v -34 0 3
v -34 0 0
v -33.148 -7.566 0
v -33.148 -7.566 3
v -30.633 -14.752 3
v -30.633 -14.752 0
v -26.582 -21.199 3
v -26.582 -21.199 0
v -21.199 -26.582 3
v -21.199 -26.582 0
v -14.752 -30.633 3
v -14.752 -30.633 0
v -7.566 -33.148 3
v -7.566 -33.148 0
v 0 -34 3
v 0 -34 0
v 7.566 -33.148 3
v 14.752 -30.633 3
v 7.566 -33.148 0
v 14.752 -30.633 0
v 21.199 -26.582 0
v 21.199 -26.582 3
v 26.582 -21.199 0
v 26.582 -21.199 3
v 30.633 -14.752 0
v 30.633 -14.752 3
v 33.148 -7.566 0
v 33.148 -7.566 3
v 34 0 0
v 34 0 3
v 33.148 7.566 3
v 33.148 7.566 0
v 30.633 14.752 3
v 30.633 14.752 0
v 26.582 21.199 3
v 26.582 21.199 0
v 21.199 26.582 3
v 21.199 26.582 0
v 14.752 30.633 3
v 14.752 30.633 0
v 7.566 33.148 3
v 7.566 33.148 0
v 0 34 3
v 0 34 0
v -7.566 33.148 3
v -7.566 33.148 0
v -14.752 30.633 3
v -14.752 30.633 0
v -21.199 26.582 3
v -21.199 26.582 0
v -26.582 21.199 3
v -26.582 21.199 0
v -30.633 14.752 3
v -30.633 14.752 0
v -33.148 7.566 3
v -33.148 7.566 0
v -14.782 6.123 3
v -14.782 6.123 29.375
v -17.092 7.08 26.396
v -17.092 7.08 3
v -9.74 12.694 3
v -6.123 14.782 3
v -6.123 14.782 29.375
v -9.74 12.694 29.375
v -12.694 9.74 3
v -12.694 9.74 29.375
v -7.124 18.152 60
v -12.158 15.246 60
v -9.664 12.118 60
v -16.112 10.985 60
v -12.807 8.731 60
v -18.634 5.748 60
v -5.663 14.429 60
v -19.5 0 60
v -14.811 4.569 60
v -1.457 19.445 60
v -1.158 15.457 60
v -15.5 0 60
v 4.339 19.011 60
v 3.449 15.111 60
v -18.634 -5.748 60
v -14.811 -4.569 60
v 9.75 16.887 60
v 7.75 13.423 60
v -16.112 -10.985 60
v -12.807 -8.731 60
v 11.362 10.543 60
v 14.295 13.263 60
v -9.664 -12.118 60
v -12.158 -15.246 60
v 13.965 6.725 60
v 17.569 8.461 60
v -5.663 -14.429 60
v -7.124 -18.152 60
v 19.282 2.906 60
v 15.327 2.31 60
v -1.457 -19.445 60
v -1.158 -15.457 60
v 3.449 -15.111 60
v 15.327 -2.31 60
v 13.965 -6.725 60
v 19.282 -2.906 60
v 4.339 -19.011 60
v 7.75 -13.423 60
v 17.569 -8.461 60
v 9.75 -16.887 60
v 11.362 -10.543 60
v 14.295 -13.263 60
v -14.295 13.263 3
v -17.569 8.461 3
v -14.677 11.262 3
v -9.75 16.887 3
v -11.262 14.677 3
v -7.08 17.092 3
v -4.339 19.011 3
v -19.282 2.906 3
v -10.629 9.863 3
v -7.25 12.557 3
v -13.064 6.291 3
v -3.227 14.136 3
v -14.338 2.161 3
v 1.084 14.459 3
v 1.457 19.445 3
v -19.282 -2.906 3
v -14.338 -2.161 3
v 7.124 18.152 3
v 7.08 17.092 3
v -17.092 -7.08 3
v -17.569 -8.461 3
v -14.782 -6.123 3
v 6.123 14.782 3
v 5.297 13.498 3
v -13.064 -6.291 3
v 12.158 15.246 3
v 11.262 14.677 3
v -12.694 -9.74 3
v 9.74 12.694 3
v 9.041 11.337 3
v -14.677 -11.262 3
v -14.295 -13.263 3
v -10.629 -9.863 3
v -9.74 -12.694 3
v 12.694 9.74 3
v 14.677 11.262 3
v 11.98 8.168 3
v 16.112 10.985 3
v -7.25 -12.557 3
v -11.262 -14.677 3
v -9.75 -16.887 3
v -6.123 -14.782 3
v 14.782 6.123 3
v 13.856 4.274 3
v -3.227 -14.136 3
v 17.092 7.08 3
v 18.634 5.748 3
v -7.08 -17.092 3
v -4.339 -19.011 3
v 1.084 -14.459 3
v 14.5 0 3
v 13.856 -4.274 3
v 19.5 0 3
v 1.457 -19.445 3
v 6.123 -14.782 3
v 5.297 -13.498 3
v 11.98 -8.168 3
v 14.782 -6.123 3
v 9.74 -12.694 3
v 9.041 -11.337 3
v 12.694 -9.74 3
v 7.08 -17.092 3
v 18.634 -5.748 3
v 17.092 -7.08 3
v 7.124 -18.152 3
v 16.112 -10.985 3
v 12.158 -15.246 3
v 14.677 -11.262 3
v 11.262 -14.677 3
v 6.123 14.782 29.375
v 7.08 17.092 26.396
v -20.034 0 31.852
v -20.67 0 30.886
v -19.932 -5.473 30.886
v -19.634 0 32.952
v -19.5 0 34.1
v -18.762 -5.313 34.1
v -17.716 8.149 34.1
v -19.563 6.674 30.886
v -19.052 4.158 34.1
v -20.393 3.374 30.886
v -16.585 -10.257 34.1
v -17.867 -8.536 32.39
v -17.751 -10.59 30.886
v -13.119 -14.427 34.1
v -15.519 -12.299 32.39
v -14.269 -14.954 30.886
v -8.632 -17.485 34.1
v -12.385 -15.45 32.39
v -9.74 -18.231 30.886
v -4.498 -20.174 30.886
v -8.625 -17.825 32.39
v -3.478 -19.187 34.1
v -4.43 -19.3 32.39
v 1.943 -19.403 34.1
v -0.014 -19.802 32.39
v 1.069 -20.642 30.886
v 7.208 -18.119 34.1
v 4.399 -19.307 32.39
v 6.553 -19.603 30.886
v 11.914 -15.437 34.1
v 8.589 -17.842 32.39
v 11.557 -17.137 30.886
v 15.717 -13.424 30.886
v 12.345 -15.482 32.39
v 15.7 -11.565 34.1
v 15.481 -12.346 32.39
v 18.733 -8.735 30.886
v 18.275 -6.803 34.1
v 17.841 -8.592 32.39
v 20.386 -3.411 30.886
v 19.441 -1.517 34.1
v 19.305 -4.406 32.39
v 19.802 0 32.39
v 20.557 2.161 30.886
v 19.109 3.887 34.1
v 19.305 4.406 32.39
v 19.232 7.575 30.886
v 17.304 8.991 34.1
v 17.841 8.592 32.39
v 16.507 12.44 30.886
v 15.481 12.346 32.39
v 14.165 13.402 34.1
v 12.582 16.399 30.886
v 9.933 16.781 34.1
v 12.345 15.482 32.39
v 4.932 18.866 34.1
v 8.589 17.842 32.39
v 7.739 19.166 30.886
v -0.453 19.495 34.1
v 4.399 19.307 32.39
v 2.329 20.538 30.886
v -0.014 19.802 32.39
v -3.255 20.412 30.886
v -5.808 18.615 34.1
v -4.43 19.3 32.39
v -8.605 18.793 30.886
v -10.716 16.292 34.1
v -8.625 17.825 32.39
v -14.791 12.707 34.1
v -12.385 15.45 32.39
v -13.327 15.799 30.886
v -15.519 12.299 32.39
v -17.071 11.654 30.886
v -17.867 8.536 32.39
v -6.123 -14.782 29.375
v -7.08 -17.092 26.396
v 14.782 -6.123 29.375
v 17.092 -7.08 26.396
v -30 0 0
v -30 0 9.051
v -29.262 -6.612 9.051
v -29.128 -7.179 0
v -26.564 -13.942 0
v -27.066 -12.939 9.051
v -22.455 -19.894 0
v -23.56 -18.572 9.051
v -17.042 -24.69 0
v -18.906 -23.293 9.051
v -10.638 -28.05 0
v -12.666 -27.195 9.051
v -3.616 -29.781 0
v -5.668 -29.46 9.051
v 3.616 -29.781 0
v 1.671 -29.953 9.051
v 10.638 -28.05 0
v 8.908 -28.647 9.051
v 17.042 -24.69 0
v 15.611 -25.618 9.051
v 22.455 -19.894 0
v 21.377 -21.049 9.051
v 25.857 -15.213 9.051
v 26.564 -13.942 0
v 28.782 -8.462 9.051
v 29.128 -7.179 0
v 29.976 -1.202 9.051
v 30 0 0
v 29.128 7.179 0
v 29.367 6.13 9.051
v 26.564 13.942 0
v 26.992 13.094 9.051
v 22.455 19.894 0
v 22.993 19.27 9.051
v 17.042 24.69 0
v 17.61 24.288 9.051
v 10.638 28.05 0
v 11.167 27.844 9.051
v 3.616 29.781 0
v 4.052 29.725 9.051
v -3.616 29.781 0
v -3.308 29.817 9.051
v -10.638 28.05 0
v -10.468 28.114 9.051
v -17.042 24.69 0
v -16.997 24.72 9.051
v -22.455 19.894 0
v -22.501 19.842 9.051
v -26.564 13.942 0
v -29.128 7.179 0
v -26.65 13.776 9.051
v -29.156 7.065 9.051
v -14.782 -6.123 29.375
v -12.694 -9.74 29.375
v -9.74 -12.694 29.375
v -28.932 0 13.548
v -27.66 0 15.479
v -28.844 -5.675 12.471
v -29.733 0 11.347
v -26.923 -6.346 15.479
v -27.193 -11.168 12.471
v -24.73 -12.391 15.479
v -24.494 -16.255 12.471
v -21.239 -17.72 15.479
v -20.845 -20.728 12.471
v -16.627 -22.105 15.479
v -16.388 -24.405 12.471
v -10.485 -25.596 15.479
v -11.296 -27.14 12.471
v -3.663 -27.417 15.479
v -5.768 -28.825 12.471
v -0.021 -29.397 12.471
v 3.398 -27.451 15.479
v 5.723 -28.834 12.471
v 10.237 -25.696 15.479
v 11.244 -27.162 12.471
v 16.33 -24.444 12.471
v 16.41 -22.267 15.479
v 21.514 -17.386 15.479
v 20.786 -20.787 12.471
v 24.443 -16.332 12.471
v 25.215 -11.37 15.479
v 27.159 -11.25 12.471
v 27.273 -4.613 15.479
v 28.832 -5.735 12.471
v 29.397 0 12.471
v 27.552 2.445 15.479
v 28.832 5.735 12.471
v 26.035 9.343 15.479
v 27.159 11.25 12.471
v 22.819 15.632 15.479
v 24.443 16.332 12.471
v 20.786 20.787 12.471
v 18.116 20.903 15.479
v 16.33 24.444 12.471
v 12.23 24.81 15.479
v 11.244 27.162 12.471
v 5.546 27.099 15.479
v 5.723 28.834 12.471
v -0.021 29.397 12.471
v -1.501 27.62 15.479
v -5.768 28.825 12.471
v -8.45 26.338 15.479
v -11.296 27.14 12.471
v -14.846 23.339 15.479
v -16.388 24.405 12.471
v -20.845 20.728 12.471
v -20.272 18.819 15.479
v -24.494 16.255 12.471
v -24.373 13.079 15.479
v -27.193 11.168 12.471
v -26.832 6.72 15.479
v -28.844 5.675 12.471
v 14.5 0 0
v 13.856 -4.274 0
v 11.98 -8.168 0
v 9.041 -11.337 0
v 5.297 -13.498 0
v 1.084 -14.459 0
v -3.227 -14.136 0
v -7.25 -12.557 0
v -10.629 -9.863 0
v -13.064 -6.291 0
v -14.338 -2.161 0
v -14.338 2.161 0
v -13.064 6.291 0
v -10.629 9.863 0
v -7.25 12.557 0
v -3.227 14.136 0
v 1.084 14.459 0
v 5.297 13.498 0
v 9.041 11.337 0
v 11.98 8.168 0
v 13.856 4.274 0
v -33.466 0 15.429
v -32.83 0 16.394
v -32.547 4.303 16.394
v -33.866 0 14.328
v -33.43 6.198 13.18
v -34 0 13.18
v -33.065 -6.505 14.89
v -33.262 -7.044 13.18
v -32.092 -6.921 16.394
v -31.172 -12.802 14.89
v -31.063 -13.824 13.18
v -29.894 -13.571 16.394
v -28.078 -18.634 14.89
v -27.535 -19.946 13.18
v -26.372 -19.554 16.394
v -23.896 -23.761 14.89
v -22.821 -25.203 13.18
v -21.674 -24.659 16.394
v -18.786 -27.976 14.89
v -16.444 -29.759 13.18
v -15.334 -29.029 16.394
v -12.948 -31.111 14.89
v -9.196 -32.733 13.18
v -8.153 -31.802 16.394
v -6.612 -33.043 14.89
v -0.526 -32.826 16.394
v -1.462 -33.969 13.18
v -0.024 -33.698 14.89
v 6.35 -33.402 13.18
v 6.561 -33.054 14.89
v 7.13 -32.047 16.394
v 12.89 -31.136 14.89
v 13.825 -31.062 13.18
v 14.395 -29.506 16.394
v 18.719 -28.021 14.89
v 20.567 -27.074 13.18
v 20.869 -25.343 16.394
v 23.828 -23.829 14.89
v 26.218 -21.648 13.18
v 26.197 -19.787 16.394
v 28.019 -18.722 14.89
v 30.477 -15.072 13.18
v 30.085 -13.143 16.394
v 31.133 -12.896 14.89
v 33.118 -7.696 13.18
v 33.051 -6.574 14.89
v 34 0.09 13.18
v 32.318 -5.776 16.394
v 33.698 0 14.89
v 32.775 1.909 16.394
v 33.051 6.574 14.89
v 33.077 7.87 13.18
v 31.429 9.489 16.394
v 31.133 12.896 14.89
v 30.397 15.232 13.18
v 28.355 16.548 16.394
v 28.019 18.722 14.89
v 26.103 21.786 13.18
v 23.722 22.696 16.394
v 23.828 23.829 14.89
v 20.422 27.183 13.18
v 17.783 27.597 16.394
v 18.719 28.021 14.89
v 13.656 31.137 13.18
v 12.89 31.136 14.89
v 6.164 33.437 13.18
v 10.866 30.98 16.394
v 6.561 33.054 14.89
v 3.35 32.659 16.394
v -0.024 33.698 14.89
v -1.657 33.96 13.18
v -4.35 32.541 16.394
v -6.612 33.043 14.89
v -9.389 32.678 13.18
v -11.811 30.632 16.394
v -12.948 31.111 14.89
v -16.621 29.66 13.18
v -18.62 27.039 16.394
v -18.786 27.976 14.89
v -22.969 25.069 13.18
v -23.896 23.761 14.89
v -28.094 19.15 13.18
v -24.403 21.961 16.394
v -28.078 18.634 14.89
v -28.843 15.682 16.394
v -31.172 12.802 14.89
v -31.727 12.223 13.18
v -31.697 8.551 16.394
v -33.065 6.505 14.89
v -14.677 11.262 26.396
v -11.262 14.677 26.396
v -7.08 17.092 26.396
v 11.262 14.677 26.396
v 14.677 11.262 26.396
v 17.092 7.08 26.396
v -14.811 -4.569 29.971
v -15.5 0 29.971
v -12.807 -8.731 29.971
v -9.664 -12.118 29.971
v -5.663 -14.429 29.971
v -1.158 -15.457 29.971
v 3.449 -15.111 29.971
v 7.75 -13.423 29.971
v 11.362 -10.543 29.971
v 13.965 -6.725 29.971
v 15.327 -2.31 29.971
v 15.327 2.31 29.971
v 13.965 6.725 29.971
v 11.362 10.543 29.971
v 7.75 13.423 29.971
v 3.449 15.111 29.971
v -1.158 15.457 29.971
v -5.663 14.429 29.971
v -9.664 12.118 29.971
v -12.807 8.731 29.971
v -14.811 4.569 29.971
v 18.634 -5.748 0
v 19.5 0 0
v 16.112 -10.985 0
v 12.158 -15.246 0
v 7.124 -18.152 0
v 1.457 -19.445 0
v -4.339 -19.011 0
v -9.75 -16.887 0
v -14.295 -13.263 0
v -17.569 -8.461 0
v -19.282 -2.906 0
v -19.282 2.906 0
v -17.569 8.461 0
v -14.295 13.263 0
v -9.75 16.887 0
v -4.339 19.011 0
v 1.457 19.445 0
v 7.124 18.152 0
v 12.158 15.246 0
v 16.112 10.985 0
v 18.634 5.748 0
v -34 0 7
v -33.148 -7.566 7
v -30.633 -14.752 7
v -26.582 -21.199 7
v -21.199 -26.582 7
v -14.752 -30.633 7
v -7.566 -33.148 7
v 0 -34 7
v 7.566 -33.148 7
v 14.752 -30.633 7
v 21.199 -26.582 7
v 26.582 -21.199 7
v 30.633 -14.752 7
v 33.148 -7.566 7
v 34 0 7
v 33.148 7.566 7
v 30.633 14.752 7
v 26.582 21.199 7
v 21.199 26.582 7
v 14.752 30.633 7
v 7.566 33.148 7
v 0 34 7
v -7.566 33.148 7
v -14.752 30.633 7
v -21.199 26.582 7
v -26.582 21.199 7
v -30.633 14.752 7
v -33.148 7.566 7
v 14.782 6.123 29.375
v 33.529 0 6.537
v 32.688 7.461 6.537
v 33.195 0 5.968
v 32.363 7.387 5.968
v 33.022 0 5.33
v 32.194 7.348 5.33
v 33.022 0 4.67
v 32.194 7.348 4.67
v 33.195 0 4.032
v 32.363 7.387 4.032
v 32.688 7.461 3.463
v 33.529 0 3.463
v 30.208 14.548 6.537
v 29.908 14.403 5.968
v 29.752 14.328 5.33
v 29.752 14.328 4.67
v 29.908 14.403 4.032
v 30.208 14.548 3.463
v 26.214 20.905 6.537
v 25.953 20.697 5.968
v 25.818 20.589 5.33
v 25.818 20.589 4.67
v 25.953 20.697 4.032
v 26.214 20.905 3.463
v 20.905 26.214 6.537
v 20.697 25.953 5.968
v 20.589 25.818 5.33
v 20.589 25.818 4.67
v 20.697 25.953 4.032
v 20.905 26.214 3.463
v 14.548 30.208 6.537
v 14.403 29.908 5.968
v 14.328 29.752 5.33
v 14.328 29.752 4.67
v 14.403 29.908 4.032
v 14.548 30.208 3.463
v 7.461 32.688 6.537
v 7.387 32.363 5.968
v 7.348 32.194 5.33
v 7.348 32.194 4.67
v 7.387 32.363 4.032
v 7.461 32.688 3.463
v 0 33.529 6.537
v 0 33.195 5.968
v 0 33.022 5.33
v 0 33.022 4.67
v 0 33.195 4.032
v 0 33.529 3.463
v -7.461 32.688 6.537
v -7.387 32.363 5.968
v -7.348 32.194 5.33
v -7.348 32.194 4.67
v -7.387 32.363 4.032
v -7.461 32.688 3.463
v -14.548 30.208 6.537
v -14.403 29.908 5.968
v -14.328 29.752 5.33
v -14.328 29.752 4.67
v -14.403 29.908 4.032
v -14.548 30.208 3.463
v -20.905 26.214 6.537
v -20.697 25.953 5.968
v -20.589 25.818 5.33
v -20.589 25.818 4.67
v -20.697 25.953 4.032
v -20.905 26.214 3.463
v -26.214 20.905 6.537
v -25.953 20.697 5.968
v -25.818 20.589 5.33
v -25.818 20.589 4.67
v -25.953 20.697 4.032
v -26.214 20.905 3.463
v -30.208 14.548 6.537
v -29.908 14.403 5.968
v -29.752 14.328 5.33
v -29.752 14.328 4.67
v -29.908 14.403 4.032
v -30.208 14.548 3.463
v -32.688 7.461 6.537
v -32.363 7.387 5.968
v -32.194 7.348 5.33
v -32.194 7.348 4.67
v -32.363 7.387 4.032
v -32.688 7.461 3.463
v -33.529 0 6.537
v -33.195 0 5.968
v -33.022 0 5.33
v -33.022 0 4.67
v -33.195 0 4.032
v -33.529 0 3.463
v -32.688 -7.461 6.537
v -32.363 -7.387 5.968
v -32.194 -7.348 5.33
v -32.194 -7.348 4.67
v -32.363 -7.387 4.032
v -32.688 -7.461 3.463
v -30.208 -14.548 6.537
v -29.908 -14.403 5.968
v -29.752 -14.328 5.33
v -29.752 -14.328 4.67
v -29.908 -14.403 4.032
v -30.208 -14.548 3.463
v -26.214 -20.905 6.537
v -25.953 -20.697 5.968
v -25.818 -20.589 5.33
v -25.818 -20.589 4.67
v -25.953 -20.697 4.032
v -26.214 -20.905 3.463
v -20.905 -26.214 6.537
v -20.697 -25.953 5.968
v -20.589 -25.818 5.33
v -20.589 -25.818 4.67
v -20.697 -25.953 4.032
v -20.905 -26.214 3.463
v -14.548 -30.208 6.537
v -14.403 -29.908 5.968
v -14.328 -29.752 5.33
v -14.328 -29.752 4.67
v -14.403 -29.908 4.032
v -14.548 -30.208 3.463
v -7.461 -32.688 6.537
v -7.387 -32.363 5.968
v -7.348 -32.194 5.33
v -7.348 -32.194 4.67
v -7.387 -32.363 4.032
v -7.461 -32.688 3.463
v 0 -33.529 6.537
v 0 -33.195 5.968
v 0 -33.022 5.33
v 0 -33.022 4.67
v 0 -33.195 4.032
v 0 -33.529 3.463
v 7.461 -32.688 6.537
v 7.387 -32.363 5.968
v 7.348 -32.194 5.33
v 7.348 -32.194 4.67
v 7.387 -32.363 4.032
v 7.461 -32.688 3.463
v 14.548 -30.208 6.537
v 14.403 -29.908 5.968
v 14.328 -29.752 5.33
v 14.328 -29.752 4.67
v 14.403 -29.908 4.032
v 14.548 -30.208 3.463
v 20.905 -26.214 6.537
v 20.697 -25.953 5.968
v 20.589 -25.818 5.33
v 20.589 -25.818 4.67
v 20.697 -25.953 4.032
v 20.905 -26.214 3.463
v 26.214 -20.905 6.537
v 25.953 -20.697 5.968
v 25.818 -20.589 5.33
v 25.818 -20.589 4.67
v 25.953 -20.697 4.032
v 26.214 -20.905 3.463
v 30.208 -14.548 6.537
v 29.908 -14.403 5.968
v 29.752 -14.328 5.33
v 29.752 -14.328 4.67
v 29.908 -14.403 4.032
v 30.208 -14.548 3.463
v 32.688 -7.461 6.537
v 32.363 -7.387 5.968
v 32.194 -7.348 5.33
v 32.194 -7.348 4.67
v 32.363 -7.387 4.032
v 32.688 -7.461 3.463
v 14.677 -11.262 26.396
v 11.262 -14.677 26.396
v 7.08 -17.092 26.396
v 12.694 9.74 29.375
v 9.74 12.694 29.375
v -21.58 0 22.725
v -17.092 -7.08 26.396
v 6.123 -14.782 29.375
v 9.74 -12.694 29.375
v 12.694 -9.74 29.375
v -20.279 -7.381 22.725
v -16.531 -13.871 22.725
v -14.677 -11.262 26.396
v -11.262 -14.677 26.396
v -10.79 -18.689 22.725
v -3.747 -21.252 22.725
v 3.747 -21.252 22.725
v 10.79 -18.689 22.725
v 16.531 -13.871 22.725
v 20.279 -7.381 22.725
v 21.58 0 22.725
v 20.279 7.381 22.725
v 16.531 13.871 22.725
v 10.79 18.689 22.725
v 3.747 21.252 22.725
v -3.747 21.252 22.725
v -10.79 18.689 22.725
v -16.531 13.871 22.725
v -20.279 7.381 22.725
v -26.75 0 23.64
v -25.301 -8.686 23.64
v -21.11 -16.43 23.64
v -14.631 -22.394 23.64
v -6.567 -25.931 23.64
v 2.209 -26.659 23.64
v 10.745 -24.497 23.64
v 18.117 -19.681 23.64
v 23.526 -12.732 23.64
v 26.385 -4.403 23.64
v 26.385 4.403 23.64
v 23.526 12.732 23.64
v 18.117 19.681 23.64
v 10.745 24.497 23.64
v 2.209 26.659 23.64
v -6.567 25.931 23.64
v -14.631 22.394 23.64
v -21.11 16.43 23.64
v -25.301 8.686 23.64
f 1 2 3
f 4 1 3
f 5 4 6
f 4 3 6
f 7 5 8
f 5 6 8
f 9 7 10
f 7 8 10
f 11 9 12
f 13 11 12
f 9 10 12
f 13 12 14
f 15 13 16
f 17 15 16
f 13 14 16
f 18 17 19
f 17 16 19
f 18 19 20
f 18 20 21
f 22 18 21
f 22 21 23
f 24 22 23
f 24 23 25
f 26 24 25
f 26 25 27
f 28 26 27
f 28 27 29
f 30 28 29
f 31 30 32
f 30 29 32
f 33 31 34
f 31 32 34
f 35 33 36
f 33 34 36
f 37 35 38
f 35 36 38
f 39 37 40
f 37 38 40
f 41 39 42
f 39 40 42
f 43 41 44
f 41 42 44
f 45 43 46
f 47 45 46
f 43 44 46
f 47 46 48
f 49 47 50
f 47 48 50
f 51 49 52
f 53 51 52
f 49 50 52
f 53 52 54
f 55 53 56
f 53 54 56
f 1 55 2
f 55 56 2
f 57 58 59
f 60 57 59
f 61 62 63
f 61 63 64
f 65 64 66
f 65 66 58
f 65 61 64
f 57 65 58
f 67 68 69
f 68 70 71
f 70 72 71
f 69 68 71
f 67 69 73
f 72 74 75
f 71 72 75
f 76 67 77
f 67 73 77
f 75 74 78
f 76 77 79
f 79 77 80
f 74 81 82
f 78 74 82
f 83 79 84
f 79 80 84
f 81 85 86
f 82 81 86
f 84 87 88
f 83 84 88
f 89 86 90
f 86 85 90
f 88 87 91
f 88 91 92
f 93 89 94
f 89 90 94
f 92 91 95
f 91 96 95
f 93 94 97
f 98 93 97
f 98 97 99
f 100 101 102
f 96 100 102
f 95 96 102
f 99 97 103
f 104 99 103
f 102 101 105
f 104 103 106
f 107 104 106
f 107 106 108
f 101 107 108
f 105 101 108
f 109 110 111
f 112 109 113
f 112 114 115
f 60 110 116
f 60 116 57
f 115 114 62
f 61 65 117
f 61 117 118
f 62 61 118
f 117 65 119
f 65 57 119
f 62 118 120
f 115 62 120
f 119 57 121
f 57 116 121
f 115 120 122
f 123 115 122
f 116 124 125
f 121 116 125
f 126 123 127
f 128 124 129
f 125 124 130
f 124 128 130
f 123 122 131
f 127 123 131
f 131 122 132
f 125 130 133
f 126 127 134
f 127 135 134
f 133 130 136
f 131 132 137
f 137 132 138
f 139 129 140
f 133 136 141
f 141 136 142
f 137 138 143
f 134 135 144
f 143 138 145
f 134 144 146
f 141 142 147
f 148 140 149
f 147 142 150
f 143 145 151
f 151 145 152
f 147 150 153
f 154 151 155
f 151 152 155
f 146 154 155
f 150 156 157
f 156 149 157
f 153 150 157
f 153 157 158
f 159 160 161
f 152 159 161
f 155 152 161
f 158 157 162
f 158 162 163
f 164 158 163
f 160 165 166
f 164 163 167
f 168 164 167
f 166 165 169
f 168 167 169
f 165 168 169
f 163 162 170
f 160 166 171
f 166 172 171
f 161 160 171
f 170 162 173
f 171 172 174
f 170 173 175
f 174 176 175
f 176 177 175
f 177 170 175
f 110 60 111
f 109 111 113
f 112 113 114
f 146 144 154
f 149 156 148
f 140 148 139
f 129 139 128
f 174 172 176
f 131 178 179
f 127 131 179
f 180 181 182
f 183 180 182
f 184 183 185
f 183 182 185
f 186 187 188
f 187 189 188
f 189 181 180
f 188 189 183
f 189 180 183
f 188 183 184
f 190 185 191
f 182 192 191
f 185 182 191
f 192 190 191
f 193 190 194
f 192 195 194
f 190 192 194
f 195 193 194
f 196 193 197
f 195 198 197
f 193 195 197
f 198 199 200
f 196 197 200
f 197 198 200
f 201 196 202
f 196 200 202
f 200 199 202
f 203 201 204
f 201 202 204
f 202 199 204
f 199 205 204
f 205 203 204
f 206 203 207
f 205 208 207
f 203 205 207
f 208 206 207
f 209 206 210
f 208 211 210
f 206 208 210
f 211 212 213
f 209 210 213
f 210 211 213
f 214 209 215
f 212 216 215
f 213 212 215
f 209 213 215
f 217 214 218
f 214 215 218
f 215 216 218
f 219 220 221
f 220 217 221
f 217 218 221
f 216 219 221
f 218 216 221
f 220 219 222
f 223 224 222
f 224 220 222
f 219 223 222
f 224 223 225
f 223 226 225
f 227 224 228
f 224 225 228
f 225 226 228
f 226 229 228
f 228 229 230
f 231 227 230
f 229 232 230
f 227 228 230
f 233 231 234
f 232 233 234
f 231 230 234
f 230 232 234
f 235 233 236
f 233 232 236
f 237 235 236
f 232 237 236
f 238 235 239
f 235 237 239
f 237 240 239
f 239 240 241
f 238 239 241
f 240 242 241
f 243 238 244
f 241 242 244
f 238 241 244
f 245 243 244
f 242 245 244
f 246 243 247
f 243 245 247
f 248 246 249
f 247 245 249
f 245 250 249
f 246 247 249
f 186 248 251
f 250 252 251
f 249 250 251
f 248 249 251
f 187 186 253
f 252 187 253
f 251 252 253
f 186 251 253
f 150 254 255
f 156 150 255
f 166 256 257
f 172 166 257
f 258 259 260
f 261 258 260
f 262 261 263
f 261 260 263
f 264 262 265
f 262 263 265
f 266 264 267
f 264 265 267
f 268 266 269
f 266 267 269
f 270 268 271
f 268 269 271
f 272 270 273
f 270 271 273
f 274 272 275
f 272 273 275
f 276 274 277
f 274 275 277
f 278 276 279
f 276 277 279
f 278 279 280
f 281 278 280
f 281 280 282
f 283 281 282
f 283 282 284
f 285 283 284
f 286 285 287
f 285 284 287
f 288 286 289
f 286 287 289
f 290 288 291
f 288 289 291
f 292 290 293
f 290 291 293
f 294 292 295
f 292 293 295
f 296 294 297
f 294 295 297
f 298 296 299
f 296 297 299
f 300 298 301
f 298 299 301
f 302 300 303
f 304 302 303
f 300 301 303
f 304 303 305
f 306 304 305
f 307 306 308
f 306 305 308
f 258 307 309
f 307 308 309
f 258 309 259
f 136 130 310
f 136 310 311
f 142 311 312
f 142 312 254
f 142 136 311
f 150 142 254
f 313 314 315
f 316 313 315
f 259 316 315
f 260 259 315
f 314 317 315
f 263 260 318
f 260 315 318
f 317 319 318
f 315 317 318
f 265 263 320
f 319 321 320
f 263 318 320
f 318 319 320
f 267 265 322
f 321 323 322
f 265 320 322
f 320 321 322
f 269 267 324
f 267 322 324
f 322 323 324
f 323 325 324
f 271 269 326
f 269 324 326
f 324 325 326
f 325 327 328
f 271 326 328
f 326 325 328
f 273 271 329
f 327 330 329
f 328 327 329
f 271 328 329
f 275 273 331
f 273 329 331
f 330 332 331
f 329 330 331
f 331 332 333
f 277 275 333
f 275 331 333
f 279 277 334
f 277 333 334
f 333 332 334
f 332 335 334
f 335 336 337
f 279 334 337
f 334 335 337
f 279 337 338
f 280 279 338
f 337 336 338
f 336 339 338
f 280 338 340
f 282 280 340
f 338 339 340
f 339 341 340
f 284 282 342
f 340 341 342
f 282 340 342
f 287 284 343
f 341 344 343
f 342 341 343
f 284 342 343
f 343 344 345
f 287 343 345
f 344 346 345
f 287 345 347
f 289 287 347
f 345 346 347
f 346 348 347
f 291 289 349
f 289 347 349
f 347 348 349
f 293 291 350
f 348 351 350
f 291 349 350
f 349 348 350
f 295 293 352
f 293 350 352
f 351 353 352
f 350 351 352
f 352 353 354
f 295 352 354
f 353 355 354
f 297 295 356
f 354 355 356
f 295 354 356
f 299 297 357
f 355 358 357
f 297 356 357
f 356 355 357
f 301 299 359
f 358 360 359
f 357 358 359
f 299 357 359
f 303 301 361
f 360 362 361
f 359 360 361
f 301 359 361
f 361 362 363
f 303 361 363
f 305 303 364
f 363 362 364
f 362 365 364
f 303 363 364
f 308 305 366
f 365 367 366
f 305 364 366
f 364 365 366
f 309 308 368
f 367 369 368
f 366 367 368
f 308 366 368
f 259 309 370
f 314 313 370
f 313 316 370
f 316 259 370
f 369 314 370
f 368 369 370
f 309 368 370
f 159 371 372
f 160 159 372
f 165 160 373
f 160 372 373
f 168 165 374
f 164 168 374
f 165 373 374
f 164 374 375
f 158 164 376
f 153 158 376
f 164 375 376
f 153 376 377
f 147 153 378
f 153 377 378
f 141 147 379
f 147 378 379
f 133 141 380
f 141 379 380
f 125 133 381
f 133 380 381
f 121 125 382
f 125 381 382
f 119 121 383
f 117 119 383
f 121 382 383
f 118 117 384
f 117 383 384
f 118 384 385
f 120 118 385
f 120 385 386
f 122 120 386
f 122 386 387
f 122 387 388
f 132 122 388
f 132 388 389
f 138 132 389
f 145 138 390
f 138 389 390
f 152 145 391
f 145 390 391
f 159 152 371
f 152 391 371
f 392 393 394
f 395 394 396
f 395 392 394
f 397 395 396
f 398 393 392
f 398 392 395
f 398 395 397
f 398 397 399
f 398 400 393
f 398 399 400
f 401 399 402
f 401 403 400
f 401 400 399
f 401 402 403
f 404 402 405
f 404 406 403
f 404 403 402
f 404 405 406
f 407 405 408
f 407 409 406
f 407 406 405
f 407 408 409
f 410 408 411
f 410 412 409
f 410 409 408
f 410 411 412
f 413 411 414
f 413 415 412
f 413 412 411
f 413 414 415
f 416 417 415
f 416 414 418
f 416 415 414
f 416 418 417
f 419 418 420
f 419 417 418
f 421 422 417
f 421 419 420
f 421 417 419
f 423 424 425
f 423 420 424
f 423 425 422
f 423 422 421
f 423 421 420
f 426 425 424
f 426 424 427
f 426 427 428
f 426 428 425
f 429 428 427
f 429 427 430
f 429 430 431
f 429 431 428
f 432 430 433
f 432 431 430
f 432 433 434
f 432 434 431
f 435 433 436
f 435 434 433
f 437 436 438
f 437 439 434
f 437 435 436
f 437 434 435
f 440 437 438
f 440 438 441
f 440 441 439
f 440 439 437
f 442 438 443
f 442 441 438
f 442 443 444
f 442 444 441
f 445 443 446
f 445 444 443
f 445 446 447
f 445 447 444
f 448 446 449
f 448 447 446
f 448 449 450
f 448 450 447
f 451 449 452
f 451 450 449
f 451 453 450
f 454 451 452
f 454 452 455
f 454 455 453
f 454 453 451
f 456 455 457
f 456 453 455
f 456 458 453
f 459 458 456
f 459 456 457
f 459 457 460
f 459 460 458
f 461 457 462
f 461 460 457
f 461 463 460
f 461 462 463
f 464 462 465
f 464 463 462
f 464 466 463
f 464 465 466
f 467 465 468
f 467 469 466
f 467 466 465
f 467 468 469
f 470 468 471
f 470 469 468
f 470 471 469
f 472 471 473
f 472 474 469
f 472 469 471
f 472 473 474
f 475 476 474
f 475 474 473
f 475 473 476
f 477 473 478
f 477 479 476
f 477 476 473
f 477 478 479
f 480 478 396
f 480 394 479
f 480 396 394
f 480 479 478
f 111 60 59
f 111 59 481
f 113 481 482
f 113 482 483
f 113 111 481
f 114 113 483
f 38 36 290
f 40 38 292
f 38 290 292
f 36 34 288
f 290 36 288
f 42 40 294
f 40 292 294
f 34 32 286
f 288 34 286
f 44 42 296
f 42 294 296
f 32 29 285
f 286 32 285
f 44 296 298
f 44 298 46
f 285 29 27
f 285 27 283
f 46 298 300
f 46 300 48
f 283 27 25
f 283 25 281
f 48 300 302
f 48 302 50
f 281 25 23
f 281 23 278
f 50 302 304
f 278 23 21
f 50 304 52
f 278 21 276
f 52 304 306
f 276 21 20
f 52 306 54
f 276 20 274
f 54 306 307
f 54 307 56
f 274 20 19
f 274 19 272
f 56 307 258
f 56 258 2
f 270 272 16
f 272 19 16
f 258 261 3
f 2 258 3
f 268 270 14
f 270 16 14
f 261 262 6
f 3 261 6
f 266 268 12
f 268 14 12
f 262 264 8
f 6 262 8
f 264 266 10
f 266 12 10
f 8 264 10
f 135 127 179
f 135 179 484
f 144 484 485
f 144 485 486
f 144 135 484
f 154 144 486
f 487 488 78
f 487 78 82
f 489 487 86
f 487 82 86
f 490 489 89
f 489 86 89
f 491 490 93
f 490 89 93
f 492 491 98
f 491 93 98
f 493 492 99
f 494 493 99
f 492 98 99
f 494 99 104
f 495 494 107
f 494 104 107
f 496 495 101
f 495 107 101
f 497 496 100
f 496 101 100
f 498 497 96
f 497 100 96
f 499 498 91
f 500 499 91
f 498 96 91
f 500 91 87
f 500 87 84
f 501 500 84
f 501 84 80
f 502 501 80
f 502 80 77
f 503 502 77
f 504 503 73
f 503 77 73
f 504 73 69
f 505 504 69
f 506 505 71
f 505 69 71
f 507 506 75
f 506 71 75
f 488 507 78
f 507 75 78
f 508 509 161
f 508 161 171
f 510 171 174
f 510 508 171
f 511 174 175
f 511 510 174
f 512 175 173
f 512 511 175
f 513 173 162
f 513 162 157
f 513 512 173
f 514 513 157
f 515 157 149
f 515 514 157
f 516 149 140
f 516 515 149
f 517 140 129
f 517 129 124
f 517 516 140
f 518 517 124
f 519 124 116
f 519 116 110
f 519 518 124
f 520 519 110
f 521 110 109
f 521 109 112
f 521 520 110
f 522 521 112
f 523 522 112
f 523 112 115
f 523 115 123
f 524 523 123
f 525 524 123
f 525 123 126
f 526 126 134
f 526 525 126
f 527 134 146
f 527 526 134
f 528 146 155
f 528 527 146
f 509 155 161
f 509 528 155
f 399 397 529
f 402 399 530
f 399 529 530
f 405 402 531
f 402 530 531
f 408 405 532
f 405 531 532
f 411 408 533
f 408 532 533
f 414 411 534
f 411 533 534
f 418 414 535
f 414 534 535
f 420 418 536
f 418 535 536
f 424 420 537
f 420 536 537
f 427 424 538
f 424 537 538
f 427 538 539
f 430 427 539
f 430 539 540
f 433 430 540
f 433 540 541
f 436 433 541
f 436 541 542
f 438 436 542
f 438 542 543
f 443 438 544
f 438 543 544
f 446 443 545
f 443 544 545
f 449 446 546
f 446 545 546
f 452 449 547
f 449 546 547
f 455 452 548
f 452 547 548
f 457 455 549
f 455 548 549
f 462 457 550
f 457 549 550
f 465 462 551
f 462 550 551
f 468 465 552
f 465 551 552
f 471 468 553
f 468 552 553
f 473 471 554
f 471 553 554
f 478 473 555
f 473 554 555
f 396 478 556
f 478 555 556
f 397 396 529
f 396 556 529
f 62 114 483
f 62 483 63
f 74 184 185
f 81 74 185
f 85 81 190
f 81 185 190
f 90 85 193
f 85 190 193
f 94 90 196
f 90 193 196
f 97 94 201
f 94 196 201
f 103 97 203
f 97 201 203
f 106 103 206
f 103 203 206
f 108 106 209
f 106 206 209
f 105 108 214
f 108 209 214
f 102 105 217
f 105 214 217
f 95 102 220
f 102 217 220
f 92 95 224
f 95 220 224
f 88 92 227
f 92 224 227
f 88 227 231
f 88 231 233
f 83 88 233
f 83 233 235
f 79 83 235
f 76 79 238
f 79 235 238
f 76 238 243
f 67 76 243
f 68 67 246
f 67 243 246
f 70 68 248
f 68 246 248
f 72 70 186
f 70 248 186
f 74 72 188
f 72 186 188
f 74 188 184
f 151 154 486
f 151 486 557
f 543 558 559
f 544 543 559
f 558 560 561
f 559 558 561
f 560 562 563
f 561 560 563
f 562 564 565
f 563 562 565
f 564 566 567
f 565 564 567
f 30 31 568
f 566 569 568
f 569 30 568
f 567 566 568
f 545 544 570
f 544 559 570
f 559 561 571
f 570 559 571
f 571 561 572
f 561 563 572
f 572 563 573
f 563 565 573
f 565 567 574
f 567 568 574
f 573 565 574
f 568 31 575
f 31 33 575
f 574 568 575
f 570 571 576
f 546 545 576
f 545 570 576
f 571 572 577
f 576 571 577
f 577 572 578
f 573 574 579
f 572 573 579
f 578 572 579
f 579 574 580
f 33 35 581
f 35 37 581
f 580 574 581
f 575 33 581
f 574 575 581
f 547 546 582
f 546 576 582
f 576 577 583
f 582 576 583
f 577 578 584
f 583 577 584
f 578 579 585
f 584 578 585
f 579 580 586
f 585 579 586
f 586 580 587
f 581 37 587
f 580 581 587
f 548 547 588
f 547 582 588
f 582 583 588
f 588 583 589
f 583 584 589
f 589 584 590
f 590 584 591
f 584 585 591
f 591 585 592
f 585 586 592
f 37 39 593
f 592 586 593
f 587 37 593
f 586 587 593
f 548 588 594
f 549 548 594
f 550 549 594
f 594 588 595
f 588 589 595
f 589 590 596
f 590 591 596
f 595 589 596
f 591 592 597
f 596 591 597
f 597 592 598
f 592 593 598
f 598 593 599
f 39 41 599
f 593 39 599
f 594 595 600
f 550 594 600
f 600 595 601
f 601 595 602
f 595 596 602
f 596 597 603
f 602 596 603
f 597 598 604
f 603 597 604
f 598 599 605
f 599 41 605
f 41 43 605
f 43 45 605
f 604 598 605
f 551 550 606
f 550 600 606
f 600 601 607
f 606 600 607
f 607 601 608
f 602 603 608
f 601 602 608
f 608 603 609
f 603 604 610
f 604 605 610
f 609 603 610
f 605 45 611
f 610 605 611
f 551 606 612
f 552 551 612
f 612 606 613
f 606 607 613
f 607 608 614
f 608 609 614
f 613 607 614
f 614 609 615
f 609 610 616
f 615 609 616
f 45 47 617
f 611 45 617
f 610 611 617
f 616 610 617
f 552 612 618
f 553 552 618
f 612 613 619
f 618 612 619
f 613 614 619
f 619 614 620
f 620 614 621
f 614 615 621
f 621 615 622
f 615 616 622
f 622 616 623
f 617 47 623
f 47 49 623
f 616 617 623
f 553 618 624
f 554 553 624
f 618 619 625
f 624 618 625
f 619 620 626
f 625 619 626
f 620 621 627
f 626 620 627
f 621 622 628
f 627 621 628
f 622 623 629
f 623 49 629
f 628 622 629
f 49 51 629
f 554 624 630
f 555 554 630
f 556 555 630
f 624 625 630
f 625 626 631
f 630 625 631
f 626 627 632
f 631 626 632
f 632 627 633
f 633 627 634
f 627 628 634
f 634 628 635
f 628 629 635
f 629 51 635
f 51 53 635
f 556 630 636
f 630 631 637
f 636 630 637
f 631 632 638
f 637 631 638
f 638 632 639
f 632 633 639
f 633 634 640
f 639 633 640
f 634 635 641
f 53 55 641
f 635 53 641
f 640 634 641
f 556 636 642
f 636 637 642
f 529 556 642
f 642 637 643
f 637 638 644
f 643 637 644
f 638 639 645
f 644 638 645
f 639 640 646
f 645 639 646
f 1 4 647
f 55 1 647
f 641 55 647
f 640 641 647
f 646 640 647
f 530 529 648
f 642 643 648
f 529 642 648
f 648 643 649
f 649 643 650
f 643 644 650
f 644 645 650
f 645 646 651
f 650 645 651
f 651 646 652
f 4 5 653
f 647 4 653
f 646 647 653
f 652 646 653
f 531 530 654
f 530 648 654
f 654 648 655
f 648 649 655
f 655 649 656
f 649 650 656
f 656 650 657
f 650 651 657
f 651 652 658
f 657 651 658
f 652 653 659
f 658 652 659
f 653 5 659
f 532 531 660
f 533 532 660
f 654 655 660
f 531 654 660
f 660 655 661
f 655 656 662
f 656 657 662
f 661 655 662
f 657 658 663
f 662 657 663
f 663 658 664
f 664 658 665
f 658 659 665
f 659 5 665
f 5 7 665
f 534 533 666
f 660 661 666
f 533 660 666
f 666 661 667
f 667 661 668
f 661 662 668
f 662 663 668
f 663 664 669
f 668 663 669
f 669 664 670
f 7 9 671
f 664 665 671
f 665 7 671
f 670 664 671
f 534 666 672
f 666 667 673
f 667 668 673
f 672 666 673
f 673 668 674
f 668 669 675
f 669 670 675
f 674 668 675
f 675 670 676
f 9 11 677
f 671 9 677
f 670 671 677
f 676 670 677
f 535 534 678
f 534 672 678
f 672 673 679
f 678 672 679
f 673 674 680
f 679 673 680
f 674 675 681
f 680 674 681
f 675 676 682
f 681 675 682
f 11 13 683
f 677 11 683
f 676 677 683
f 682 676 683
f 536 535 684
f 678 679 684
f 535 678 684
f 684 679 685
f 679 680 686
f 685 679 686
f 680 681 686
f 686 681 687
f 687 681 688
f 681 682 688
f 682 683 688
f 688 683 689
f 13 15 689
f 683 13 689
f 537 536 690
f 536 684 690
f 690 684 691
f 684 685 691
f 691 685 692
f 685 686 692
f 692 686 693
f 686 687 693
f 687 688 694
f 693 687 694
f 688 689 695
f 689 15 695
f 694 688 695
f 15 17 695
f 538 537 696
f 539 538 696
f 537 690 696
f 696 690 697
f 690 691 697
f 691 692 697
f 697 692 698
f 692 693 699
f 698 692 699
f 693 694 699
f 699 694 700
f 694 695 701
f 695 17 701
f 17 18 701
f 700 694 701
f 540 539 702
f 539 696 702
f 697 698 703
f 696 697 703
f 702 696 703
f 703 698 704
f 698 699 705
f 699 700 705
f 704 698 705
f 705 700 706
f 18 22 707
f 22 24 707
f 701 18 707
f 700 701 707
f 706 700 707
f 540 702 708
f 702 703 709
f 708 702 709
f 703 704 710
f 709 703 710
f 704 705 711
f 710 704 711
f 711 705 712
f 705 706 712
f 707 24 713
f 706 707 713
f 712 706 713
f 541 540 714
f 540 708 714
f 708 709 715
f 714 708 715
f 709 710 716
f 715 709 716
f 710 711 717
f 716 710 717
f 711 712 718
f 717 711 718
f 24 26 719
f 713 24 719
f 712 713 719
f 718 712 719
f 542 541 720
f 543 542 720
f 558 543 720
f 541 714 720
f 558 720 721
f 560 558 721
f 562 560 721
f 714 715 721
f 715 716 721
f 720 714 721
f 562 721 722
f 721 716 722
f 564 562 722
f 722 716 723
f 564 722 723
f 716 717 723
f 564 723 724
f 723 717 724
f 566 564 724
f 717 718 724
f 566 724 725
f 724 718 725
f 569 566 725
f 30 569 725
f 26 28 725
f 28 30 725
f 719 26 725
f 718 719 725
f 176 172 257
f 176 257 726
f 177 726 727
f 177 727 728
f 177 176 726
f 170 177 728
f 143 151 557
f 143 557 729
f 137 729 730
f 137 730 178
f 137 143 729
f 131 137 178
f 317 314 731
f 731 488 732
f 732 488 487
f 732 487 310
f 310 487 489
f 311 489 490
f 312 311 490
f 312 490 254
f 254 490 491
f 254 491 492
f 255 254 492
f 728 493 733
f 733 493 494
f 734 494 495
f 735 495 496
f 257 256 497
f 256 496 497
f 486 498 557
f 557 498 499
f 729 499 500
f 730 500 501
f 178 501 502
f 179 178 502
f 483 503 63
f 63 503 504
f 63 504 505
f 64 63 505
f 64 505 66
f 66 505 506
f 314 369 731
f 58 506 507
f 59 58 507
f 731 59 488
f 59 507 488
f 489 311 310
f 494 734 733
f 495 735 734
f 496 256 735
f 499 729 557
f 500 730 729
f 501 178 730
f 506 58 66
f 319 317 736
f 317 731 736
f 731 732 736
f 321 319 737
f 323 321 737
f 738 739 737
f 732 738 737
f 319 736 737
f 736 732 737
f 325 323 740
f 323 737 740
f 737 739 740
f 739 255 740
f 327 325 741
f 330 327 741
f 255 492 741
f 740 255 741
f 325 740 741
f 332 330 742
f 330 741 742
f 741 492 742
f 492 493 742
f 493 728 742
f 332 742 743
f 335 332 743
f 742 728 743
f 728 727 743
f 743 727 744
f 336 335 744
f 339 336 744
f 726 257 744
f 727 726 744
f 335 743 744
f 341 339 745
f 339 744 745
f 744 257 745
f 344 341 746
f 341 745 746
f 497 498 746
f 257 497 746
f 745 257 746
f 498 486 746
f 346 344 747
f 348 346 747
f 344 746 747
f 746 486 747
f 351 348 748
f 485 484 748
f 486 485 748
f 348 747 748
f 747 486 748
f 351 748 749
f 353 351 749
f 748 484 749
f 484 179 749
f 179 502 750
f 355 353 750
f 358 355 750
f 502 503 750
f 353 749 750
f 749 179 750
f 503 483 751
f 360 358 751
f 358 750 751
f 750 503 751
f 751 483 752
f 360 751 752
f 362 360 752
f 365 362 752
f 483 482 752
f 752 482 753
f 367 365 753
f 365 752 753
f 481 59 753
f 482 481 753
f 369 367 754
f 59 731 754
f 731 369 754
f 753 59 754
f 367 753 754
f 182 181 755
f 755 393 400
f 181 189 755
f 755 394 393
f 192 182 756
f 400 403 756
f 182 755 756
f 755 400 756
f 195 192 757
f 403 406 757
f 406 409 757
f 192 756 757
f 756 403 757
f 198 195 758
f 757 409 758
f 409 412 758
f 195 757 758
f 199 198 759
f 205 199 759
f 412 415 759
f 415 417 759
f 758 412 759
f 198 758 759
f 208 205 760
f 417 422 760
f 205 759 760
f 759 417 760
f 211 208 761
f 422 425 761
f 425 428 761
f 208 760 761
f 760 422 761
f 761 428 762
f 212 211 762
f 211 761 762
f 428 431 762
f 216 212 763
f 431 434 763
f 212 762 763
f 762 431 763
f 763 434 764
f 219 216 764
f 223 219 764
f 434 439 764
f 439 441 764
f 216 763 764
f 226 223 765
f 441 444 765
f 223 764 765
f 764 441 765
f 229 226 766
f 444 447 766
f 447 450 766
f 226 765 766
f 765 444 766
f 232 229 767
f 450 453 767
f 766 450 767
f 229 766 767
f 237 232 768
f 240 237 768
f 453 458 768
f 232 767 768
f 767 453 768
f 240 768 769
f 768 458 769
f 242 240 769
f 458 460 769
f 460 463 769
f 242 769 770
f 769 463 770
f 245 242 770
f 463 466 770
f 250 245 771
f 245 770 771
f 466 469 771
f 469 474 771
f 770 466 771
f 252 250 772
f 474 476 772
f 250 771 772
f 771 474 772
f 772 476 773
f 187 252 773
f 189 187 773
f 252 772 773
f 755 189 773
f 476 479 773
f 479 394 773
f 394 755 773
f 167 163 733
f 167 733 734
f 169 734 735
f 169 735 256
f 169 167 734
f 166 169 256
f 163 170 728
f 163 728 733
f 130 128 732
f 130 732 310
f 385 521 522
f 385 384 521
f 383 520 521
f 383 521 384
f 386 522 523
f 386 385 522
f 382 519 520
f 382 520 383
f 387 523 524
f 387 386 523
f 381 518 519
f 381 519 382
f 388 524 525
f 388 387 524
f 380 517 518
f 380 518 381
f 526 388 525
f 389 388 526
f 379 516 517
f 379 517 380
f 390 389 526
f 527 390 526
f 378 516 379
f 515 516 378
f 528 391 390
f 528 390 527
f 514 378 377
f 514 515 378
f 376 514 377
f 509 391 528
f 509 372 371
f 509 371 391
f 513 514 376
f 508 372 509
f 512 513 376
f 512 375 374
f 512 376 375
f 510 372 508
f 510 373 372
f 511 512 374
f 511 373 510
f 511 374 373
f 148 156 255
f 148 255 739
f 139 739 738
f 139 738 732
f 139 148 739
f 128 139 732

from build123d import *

# Parameters (mm, degrees)
F4_R     = 19.5
F4_R_2   = 14.5
F5_DEPTH = 3
F6_R     = 2.5
F8_R     = 10
F9_R     = 5
F10_R    = 5


with BuildPart() as f1:
    # F0 (on Front) → F1 (revolve)
    with BuildSketch(Plane.XZ):
        Polygon((-34, 0), (-30, 0), (-30, 12.6905989232), (-34, 15), align=None)
        Polygon((-34, 15), (-30, 12.6905989232), (-15.5, 29.9710260159), (-19.5, 32.2804270926), align=None)
        Polygon((-19.5, 32.2804270926), (-15.5, 29.9710260159), (-15.5, 60), (-19.5, 60), align=None)
    revolve(axis=Axis((0, 0, 34.7761163735), (0, 0, 1)))

    # F2 (on face) → F3 (join, up to the next surface of F1)
    with BuildSketch(Plane(origin=(0, 0, 0), x_dir=(1, 0, 0), z_dir=(0, 0, -1))):
        with BuildLine():
            ThreePointArc((-6.1229349178, -14.7820725202), (-11.313708499, -11.313708499), (-14.7820725202, -6.1229349178))
            Line((-14.7820725202, -6.1229349178), (-17.0917713515, -7.0796434988))
            ThreePointArc((-17.0917713515, -7.0796434988), (-13.081475452, -13.081475452), (-7.0796434988, -17.0917713515))
            Line((-7.0796434988, -17.0917713515), (-6.1229349178, -14.7820725202))
        make_face()
        with BuildLine():
            ThreePointArc((7.0796434988, -17.0917713515), (13.081475452, -13.081475452), (17.0917713515, -7.0796434988))
            Line((17.0917713515, -7.0796434988), (14.7820725202, -6.1229349178))
            ThreePointArc((14.7820725202, -6.1229349178), (11.313708499, -11.313708499), (6.1229349178, -14.7820725202))
            Line((6.1229349178, -14.7820725202), (7.0796434988, -17.0917713515))
        make_face()
        with BuildLine():
            Line((-17.0917713515, 7.0796434988), (-14.7820725202, 6.1229349178))
            ThreePointArc((-14.7820725202, 6.1229349178), (-11.313708499, 11.313708499), (-6.1229349178, 14.7820725202))
            Line((-6.1229349178, 14.7820725202), (-7.0796434988, 17.0917713515))
            ThreePointArc((-7.0796434988, 17.0917713515), (-13.081475452, 13.081475452), (-17.0917713515, 7.0796434988))
        make_face()
        with BuildLine():
            Line((14.7820725202, 6.1229349178), (17.0917713515, 7.0796434988))
            ThreePointArc((17.0917713515, 7.0796434988), (13.081475452, 13.081475452), (7.0796434988, 17.0917713515))
            Line((7.0796434988, 17.0917713515), (6.1229349178, 14.7820725202))
            ThreePointArc((6.1229349178, 14.7820725202), (11.313708499, 11.313708499), (14.7820725202, 6.1229349178))
        make_face()
    extrude(until=Until.NEXT, dir=(0, 0, 1))

    # F4 (on face) → F5 (join)
    with BuildSketch(Plane(origin=(0, 0, 0), x_dir=(1, 0, 0), z_dir=(0, 0, -1))):
        Circle(F4_R)
        Circle(F4_R_2, mode=Mode.SUBTRACT)
    extrude(amount=-F5_DEPTH)

    # F6 (on Front) → F7 (revolve, cut)
    with BuildSketch(Plane.XZ):
        with Locations((35.5, 5)):
            Circle(F6_R)
    revolve(axis=Axis((0, 0, 1.7348565161), (0, 0, 1)), mode=Mode.SUBTRACT)

    # F8
    f8_edges = [f1.edges().sort_by_distance(p)[0] for p in [
        (30, 0, 12.690599),
    ]]
    fillet(f8_edges, radius=F8_R)

    # F9
    f9_edges = [f1.edges().sort_by_distance(p)[0] for p in [
        (34, 0, 15),
    ]]
    fillet(f9_edges, radius=F9_R)

    # F10
    f10_edges = [f1.edges().sort_by_distance(p)[0] for p in [
        (19.5, 0, 32.280427),
    ]]
    fillet(f10_edges, radius=F10_R)


solid = f1.part
